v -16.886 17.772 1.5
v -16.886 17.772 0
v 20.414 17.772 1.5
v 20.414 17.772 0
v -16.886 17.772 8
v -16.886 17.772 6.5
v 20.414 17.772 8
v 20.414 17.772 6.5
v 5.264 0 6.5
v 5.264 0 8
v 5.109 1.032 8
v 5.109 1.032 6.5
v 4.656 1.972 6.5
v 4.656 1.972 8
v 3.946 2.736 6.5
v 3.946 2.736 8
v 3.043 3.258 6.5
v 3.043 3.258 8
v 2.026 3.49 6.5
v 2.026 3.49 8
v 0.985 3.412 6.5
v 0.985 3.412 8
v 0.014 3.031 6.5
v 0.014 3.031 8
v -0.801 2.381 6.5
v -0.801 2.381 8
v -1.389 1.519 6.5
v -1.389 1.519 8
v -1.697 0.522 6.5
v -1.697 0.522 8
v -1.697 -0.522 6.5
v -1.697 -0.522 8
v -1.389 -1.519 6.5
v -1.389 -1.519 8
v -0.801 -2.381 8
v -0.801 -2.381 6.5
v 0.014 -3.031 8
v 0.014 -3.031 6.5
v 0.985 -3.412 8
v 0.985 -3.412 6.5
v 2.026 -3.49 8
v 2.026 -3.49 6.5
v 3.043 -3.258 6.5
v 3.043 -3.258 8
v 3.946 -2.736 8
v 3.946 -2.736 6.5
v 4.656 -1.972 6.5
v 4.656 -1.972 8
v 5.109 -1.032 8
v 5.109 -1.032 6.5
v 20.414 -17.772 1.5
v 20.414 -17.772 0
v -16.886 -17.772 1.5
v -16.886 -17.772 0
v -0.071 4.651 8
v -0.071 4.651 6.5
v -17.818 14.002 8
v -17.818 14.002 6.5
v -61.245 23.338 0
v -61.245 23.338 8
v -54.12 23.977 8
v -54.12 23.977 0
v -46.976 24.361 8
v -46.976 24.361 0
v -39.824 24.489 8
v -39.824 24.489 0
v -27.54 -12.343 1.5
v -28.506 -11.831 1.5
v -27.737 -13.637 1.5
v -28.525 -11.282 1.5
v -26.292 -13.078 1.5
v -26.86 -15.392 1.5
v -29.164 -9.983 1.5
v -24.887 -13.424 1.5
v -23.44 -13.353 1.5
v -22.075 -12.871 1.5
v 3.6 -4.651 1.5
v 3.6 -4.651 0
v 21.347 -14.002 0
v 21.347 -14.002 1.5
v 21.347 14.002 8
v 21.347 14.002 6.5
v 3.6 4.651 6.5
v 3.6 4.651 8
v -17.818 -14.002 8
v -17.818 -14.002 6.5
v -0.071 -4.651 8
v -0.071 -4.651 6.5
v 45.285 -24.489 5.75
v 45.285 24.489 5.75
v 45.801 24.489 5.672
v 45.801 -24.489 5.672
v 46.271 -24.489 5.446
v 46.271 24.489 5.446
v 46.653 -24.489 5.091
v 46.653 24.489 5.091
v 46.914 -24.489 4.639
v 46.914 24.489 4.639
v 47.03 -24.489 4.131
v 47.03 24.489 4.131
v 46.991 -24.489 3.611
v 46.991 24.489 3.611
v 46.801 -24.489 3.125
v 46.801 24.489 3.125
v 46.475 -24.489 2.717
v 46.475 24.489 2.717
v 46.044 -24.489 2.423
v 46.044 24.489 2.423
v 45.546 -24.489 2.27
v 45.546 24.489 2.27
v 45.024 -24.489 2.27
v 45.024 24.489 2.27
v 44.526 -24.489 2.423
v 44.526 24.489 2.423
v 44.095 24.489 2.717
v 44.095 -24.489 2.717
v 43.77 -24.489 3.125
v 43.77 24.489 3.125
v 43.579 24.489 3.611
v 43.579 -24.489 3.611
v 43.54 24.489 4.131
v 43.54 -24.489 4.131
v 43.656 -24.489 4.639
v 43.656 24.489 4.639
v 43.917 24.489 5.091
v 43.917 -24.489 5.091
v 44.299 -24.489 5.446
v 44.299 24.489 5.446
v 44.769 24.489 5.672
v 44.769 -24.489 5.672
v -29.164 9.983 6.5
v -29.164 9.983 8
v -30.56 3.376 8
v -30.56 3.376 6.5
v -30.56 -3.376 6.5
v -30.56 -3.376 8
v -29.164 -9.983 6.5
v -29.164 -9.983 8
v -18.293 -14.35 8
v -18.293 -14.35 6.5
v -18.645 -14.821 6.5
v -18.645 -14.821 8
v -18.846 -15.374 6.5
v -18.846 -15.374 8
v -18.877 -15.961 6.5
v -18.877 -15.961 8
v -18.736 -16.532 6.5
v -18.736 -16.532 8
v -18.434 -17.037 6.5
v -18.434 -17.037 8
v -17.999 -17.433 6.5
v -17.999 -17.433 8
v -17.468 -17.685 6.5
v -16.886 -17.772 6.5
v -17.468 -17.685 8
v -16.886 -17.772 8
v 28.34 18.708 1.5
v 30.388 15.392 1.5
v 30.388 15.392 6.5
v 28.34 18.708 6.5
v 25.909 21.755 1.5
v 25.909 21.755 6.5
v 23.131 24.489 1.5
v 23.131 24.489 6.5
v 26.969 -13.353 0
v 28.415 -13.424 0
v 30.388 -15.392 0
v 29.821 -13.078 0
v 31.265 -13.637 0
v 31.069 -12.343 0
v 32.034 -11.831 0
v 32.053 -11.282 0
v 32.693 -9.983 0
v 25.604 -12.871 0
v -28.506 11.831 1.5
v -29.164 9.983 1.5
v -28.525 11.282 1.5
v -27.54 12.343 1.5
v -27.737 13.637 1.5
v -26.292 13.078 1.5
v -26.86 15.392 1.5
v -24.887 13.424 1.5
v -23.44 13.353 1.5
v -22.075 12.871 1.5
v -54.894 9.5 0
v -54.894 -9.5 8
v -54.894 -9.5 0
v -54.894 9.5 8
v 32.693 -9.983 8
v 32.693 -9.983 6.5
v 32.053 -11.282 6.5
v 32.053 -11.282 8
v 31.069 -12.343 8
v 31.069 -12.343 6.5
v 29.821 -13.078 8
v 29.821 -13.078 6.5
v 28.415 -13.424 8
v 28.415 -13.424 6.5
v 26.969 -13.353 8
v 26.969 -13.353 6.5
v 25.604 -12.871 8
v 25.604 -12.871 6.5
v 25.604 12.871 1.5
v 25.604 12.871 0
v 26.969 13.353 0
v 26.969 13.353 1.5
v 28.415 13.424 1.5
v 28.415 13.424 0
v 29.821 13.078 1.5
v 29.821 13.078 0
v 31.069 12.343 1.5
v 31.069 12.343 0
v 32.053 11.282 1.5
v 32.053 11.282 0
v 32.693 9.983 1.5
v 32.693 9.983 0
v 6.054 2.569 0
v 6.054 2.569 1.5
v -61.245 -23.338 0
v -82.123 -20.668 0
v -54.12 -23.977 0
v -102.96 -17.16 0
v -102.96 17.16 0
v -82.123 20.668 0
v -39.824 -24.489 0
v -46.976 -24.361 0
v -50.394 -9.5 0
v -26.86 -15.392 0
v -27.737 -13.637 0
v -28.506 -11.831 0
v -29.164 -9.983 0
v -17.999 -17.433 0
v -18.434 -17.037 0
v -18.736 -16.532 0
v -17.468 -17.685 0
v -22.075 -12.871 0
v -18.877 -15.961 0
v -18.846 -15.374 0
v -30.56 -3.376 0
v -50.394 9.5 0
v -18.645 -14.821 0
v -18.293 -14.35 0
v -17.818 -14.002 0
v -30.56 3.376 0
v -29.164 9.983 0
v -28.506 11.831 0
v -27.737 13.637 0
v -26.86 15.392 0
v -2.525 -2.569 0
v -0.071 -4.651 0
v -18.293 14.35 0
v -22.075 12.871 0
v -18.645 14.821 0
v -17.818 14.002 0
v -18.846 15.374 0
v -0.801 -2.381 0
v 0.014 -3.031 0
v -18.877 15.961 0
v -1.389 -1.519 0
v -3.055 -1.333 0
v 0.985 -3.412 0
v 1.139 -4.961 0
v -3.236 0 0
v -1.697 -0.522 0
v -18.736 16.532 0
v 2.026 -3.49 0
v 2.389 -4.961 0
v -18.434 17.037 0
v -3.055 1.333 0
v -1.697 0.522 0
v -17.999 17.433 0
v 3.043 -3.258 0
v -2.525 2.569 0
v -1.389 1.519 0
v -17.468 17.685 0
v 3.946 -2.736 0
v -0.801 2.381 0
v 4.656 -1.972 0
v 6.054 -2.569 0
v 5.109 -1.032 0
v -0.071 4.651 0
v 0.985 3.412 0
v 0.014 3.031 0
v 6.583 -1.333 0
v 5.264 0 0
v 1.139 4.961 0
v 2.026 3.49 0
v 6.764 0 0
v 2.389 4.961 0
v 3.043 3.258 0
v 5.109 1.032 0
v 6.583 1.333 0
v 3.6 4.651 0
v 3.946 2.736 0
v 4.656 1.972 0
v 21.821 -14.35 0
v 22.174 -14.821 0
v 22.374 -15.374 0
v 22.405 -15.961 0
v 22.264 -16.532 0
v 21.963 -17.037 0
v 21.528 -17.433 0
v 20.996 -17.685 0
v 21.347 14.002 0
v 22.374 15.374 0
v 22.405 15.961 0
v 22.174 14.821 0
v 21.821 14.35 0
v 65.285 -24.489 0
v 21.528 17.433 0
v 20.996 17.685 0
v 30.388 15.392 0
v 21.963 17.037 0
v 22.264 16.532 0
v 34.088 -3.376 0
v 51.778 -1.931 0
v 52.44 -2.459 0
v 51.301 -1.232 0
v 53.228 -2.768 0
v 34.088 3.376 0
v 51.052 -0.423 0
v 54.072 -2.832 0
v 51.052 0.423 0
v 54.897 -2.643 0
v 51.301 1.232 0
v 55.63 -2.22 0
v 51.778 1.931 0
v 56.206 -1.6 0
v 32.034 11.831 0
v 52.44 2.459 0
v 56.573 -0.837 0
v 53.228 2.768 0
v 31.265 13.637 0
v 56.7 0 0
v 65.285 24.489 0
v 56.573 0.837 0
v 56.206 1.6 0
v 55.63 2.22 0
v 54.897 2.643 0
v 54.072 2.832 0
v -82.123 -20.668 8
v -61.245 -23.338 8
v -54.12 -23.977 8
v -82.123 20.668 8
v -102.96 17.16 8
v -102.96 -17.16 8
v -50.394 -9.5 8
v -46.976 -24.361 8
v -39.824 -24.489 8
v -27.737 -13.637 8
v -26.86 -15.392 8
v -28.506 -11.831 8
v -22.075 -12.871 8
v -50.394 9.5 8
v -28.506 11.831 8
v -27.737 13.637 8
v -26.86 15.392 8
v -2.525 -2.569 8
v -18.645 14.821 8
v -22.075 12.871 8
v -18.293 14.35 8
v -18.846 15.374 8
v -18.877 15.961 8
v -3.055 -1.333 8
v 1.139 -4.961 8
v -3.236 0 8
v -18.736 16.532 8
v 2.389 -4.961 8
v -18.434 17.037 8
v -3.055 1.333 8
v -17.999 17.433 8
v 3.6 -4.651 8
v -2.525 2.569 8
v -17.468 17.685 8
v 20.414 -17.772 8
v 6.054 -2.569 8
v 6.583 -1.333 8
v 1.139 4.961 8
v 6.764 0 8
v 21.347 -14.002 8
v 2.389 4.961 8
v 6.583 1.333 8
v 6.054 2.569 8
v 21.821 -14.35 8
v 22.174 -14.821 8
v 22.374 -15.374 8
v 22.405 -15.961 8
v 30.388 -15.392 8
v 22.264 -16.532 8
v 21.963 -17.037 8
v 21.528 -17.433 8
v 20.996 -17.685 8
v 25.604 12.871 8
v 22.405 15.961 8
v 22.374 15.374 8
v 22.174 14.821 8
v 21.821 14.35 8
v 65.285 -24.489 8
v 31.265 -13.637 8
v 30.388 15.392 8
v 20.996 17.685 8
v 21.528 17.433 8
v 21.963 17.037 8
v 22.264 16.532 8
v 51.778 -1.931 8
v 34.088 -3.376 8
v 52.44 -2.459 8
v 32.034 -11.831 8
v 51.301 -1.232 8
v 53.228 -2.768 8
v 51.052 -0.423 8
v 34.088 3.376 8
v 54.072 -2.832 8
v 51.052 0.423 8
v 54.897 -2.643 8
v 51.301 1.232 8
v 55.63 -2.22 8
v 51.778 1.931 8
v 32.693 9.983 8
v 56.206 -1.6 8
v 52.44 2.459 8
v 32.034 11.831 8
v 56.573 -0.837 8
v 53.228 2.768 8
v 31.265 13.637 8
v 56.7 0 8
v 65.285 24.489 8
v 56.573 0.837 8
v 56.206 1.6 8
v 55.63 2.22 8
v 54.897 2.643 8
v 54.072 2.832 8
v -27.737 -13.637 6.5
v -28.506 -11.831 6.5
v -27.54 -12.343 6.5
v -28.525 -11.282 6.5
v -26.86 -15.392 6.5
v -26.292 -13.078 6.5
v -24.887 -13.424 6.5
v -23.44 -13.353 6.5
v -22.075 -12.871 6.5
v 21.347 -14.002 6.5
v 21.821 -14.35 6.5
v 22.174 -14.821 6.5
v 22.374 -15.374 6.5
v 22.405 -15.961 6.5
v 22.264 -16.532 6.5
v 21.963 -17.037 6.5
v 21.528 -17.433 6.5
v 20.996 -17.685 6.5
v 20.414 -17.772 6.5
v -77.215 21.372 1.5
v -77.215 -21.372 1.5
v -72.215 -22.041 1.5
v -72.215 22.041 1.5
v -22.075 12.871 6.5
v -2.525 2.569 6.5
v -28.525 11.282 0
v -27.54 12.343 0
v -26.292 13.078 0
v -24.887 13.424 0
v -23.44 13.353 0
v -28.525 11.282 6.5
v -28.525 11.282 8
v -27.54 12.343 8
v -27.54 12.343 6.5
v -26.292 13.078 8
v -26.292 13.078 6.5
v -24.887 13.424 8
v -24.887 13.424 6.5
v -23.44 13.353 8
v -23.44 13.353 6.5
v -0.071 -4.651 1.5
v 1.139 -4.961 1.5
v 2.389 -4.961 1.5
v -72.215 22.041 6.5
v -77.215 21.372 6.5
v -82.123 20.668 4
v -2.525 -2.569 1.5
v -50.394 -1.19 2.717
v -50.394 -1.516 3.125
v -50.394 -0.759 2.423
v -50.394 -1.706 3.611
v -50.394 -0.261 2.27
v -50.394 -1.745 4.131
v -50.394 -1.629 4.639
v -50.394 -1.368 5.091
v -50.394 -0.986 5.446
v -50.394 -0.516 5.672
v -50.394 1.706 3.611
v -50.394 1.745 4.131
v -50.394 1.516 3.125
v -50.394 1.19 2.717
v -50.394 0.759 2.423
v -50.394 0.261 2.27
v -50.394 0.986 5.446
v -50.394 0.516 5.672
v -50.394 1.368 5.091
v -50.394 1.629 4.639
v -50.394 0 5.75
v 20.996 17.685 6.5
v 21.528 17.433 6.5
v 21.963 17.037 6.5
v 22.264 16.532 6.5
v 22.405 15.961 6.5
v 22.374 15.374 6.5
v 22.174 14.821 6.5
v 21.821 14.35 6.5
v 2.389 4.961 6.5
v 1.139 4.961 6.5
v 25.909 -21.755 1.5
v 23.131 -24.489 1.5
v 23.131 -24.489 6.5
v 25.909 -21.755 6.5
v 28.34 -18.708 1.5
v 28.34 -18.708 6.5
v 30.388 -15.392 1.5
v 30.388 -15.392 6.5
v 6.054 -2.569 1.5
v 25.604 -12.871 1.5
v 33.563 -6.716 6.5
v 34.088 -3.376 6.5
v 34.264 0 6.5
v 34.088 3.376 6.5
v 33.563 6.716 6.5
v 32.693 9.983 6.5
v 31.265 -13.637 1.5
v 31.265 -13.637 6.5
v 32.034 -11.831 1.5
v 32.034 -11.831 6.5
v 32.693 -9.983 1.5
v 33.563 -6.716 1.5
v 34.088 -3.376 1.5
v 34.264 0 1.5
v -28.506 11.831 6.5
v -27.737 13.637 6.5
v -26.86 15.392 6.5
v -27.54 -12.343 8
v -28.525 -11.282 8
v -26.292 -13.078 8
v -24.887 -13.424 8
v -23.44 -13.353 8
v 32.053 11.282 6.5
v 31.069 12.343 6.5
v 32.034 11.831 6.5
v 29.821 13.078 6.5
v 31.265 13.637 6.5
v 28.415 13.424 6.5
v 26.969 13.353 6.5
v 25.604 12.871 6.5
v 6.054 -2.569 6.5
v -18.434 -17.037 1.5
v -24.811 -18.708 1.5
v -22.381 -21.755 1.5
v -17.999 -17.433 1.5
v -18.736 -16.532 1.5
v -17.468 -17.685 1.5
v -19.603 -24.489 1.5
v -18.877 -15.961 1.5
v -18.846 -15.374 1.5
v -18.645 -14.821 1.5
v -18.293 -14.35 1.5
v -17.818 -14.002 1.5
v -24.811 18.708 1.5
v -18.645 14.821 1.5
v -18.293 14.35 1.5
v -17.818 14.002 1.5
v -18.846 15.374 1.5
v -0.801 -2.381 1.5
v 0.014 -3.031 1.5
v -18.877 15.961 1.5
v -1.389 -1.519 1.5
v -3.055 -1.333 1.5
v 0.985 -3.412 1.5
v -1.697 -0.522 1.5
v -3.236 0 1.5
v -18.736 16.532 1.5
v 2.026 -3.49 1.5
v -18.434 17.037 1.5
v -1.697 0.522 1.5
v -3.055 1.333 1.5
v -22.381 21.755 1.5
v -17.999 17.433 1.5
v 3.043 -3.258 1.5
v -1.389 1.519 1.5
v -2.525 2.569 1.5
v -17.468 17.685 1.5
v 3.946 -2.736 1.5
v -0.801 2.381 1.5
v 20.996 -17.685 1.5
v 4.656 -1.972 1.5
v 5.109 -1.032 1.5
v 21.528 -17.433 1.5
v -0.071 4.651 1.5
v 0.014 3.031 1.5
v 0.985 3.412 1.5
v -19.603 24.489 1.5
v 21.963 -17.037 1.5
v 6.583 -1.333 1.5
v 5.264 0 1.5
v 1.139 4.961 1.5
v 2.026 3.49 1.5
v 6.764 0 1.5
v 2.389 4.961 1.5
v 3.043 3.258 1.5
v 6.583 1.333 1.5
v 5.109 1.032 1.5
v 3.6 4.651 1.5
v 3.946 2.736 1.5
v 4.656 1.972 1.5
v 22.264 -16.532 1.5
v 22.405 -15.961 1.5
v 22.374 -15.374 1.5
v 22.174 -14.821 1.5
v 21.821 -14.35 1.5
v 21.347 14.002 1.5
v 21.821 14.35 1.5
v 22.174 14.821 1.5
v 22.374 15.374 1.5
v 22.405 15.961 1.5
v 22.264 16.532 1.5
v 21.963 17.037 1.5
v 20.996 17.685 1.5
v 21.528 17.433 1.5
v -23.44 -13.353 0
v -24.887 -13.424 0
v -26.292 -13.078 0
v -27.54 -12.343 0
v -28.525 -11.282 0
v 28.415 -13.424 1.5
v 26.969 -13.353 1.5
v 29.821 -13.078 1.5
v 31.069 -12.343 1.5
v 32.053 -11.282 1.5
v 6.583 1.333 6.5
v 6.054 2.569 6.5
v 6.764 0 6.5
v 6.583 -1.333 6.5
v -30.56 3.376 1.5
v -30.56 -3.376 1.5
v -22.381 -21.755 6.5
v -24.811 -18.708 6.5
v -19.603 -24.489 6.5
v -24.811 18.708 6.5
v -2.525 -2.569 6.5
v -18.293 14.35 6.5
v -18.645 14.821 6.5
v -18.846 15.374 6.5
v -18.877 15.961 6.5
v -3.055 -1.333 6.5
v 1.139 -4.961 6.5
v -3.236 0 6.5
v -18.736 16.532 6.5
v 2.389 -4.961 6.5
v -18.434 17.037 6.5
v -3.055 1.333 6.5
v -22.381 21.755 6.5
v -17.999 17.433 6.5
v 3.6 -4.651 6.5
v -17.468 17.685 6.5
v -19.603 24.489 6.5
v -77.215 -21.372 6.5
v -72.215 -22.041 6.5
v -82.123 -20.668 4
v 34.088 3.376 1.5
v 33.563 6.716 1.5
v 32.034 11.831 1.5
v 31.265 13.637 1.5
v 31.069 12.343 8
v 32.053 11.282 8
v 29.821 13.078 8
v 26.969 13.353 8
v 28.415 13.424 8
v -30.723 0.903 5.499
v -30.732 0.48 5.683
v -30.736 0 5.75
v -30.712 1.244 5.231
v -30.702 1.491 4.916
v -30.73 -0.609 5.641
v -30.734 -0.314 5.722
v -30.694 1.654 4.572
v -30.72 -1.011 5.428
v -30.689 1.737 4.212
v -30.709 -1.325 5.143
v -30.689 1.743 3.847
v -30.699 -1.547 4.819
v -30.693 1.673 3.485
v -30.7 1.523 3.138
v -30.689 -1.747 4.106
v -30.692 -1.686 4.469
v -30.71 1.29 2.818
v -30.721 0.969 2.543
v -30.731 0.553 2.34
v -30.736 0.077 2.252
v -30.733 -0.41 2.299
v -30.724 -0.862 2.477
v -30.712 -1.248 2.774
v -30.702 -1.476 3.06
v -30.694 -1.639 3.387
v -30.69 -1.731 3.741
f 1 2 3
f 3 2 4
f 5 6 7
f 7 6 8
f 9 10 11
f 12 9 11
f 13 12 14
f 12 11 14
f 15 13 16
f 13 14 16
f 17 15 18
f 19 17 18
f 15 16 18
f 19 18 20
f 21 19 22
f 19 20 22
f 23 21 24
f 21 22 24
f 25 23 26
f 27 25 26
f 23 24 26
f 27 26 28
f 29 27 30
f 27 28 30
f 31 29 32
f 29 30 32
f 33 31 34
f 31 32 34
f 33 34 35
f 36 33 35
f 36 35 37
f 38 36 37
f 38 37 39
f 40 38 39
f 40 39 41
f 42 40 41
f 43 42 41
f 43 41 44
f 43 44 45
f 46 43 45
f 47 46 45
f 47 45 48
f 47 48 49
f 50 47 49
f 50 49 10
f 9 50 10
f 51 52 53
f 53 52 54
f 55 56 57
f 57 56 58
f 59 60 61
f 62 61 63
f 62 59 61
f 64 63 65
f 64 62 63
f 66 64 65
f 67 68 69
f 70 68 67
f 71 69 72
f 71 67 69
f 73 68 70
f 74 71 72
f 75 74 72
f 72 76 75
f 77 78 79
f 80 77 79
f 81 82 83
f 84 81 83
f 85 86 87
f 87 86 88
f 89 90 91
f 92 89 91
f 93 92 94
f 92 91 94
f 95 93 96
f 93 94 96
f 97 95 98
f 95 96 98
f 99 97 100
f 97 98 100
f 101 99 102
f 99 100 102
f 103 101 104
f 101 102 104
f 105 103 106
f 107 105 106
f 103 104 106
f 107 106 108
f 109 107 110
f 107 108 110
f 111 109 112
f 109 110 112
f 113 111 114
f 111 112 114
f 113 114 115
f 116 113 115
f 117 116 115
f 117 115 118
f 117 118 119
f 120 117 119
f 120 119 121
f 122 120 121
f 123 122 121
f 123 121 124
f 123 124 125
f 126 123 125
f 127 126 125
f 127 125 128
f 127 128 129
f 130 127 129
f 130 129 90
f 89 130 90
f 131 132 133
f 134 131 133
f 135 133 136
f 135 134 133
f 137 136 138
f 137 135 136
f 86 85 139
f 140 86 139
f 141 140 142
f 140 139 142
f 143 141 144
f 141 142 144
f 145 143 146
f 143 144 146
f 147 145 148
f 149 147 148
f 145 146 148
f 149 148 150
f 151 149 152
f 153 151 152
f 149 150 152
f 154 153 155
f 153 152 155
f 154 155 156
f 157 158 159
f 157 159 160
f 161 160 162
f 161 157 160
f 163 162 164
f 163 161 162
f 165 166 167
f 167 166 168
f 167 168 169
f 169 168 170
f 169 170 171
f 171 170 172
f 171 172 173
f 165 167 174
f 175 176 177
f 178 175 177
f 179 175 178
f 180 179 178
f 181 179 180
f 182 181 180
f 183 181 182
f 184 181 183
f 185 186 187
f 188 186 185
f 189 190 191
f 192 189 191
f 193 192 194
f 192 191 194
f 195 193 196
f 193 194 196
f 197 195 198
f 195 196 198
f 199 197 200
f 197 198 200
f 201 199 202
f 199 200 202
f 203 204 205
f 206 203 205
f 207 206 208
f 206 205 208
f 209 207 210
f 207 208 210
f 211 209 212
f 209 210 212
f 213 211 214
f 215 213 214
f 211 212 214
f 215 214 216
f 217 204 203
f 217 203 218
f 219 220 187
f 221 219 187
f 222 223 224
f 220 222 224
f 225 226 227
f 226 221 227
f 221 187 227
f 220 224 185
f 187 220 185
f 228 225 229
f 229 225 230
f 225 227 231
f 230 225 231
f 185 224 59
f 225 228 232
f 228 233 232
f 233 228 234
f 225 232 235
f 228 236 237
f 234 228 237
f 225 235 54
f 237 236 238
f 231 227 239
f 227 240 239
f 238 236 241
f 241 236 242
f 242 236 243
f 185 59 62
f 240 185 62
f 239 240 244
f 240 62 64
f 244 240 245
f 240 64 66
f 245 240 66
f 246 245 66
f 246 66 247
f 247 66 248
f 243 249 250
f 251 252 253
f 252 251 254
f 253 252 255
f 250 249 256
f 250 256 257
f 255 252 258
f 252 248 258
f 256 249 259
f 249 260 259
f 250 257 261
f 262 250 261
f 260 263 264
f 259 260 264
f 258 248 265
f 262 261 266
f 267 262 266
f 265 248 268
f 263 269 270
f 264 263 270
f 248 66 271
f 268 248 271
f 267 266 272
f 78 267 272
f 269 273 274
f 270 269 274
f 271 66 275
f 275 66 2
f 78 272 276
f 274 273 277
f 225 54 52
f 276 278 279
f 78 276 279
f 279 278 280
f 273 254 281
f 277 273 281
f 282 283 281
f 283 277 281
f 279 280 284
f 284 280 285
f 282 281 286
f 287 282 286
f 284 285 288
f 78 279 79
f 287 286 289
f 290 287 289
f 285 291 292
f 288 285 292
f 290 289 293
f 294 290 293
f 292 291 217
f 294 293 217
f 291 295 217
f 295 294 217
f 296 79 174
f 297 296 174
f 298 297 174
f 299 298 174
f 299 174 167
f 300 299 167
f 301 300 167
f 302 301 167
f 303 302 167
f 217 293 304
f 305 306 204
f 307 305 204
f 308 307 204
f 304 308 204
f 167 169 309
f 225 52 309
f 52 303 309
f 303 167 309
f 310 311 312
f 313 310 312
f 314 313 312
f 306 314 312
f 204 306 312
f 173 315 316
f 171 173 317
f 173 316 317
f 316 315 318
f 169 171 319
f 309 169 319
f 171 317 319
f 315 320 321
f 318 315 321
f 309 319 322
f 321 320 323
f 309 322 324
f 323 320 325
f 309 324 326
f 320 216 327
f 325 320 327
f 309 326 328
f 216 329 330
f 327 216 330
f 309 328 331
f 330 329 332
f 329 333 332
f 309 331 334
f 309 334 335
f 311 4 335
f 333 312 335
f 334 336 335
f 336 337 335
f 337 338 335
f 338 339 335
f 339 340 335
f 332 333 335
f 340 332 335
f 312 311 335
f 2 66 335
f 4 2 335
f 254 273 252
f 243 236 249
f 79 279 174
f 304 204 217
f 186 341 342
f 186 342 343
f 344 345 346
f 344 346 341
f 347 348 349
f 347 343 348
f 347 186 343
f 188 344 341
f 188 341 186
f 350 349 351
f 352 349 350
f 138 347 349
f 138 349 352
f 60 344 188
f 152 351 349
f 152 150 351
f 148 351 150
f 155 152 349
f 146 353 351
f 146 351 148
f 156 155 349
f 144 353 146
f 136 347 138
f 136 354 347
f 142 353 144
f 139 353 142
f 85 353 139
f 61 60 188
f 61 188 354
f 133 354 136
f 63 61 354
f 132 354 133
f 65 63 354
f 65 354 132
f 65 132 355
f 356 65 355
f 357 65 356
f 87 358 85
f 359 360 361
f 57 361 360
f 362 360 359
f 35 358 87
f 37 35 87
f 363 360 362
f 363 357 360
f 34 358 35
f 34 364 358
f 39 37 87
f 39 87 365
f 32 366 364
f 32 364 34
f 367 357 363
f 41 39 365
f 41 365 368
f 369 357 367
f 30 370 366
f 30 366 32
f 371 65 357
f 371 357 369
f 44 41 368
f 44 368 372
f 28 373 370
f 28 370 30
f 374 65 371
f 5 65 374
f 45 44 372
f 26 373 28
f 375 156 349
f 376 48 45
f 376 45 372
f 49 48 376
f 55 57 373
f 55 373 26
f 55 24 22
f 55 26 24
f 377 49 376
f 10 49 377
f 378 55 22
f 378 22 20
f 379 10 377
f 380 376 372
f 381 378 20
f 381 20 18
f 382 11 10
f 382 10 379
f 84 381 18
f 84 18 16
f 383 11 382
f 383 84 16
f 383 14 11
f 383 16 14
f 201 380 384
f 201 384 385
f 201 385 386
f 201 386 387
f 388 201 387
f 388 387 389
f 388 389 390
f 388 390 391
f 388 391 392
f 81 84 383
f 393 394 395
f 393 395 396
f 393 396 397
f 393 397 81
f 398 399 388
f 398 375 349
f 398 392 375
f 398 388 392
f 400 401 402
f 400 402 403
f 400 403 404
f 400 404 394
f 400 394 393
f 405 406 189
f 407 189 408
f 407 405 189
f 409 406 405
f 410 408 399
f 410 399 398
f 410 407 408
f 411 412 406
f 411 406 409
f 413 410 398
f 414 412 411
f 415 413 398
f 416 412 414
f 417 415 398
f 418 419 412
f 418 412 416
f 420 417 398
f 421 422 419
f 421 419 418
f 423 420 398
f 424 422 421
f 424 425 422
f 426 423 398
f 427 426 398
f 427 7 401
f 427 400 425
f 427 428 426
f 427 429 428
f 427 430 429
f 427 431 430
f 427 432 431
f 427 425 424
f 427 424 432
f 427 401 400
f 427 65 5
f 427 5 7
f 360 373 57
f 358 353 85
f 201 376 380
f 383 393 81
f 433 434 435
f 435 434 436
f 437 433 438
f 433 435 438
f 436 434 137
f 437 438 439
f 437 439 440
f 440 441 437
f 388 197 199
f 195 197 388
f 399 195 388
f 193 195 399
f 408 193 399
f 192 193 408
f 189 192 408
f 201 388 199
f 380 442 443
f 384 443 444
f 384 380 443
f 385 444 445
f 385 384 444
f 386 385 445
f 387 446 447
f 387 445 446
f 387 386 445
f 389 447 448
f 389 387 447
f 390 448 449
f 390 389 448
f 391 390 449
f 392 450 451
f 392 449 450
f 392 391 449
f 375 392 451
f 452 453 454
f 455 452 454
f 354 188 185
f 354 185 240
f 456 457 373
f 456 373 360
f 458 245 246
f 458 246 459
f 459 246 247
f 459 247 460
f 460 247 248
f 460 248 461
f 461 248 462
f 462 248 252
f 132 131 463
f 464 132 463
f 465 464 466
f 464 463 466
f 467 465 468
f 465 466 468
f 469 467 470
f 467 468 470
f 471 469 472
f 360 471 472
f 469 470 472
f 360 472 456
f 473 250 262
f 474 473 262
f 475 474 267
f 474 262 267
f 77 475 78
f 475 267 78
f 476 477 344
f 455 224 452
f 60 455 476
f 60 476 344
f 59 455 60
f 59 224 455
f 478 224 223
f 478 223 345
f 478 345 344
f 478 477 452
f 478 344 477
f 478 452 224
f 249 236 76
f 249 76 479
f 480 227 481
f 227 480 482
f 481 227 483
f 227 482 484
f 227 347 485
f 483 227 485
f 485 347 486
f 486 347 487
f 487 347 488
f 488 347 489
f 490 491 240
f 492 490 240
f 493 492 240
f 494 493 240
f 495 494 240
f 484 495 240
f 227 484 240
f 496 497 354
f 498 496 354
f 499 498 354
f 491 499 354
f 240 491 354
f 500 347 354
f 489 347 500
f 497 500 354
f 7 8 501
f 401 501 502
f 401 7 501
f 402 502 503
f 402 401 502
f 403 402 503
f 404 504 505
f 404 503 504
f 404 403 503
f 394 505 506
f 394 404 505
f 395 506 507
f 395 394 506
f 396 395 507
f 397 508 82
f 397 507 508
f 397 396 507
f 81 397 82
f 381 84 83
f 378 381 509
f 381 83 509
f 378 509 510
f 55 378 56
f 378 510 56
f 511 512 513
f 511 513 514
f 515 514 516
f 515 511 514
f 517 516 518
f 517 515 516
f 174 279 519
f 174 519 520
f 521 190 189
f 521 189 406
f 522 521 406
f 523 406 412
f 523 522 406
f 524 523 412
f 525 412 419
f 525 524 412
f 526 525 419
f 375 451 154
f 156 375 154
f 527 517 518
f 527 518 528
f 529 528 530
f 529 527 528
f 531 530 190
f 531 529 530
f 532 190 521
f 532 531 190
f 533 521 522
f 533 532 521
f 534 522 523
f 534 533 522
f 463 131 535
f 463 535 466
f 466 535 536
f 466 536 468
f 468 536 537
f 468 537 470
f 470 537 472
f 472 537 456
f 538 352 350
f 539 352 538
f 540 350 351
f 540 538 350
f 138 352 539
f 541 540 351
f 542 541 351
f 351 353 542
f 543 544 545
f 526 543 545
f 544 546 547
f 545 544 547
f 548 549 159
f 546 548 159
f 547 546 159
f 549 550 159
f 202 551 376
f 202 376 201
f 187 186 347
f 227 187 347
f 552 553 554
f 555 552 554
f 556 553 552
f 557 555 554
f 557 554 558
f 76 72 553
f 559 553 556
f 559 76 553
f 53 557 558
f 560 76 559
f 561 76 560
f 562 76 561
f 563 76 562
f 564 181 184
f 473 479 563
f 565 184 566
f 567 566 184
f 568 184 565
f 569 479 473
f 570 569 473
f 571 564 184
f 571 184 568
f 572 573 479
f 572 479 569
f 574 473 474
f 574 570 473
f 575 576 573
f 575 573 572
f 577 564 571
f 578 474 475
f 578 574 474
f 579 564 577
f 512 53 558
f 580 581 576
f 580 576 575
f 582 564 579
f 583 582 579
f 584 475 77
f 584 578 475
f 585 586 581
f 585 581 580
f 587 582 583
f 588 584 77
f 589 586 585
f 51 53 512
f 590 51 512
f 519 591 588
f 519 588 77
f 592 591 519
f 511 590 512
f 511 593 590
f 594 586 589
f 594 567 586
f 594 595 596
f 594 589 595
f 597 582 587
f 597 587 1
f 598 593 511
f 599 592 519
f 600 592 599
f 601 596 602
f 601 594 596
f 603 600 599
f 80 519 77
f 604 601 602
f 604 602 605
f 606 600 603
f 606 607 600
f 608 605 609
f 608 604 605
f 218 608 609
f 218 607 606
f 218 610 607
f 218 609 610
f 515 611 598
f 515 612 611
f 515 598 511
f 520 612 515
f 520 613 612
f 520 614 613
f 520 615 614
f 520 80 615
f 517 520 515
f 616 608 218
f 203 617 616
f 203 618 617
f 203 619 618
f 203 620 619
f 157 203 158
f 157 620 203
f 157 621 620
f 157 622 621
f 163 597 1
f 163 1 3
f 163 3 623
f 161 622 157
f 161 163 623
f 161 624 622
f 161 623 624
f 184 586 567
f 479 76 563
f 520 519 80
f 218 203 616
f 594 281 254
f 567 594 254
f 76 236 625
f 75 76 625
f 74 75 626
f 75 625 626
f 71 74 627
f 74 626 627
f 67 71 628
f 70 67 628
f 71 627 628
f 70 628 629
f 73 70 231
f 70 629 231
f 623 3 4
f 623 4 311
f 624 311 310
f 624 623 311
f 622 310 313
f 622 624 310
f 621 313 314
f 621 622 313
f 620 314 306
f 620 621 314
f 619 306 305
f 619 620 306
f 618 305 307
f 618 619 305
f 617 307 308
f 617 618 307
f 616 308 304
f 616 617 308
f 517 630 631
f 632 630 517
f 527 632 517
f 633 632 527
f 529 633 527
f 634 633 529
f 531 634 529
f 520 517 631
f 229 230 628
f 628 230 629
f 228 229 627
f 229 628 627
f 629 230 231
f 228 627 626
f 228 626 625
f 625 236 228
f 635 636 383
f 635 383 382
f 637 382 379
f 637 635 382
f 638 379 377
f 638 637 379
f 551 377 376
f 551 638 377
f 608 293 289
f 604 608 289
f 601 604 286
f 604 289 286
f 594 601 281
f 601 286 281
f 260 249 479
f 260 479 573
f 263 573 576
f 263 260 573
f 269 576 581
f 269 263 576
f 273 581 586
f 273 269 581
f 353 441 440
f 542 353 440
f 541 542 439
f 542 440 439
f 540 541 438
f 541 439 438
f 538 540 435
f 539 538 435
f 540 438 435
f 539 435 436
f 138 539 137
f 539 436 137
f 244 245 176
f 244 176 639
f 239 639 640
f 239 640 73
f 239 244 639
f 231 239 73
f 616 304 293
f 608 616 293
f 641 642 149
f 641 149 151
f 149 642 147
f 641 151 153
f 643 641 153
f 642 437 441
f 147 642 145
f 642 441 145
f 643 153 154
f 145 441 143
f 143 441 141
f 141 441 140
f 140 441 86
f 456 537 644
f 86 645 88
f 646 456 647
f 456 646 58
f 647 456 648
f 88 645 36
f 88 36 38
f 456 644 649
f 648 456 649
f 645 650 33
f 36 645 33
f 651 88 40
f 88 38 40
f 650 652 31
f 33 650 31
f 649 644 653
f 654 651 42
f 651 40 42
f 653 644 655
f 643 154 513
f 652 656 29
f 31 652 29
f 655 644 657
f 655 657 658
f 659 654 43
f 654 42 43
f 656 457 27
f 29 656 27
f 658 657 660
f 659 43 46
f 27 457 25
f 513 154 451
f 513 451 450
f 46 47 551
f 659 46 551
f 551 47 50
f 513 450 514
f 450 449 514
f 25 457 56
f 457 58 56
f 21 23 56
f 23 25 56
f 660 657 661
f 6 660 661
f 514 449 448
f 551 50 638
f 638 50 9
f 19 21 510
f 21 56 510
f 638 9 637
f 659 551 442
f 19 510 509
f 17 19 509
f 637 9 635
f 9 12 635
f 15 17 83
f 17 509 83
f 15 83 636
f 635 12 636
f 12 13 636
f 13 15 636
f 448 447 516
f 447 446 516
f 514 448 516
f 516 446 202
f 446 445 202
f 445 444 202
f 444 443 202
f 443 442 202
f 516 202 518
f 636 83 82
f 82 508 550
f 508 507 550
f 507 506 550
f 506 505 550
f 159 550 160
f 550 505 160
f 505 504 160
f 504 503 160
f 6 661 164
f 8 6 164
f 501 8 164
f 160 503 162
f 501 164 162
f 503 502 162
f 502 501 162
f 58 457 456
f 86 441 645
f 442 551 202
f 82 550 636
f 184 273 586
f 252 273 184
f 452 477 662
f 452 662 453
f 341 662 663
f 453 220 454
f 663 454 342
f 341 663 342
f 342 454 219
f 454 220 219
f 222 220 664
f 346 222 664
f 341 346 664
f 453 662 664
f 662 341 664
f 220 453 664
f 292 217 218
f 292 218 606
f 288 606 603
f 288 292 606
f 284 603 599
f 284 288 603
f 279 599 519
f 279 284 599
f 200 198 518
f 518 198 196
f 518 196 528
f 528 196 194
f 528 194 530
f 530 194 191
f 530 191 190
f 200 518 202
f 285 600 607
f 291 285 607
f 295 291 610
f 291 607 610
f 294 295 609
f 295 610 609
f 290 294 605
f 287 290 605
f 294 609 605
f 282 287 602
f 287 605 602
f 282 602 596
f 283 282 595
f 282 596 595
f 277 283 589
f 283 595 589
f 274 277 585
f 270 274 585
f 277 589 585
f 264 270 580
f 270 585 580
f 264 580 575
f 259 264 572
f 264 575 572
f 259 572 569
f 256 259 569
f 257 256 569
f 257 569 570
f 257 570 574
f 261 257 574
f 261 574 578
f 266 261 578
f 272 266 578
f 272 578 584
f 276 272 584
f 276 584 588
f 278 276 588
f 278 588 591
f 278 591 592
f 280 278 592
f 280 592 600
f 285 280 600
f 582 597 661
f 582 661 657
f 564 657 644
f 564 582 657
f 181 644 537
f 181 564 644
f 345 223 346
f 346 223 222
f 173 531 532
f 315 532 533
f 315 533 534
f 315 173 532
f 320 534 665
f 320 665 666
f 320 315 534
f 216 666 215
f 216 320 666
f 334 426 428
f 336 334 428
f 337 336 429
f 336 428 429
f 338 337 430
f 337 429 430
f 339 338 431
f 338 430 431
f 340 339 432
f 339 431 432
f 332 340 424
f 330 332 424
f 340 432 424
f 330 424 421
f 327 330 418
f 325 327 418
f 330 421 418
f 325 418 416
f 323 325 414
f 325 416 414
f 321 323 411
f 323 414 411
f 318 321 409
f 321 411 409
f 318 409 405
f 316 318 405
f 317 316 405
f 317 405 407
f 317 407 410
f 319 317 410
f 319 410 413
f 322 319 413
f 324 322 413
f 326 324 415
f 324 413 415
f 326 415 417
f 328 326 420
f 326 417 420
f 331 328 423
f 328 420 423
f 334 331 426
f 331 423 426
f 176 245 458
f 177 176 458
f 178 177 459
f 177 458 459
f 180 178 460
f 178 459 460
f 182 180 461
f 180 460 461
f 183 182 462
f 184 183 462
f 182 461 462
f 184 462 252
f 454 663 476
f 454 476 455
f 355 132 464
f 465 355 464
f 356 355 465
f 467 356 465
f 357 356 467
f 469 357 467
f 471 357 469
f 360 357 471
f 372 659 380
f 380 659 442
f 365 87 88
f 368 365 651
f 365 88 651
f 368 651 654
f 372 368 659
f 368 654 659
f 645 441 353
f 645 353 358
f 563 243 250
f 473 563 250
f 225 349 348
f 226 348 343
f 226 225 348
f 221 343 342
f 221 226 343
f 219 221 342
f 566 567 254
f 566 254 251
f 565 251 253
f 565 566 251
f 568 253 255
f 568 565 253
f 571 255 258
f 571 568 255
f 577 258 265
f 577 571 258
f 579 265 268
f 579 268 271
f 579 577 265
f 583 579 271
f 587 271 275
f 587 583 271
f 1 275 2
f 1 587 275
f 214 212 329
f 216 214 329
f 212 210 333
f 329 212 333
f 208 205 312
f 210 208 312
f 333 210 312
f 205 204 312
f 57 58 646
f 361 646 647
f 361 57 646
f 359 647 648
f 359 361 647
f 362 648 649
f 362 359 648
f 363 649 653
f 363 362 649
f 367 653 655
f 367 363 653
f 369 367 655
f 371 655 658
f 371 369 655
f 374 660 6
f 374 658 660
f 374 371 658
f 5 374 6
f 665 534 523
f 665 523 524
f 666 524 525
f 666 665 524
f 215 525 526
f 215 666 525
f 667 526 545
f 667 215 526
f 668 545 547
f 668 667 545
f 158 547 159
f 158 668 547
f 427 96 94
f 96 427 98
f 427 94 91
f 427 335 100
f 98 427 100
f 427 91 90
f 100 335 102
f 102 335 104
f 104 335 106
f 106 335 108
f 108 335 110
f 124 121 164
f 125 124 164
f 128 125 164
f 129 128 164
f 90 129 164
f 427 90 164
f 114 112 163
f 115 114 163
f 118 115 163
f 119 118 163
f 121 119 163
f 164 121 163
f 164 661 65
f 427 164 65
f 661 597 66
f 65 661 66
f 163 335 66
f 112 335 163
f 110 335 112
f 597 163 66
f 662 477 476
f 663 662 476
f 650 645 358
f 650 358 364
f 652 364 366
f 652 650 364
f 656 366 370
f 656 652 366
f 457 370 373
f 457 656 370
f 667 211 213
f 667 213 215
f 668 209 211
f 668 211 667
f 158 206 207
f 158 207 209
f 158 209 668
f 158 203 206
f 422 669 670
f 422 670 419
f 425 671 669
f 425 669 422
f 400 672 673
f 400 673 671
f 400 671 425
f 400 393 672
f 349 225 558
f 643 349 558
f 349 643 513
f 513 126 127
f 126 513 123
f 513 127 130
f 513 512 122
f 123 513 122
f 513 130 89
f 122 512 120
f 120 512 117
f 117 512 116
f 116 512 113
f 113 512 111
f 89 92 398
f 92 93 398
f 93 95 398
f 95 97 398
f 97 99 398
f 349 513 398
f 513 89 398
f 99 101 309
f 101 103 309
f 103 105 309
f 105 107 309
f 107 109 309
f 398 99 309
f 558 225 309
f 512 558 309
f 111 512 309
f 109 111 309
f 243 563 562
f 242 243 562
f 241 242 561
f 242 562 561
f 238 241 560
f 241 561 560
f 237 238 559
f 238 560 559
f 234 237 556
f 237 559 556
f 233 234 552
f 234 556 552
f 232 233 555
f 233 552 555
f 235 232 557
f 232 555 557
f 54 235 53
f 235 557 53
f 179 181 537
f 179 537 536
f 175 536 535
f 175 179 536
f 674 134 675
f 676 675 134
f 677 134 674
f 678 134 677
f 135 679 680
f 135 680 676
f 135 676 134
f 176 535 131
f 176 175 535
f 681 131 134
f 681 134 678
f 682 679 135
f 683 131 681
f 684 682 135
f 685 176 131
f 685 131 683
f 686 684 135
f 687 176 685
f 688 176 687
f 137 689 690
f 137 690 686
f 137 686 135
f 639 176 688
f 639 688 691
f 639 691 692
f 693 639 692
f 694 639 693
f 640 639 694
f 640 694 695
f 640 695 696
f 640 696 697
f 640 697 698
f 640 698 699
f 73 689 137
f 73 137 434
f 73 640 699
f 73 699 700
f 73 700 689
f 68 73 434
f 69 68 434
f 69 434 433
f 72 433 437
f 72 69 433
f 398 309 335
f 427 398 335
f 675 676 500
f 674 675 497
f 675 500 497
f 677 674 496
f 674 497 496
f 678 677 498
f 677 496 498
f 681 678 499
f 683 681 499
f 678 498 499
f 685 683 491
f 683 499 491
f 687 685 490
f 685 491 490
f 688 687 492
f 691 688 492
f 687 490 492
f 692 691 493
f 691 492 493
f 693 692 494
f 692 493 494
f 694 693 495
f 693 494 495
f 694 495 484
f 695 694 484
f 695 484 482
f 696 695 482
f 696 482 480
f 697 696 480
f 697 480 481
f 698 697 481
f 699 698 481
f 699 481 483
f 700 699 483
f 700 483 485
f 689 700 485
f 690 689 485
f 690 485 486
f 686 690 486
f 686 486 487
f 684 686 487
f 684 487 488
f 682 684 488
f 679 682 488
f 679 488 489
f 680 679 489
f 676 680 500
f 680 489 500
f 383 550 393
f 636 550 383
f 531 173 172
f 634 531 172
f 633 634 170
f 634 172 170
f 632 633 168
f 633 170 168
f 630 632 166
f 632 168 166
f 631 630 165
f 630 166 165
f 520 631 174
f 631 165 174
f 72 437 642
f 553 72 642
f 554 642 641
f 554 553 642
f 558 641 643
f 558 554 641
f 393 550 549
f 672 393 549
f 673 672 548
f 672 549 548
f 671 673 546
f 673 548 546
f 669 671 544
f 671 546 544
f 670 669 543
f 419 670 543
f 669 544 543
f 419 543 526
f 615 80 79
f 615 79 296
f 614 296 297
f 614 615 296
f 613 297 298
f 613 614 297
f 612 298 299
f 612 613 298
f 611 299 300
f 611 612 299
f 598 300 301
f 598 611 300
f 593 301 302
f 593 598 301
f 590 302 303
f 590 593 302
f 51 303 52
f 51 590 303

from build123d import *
from build123d.topology import SkipClean

# Parameters (mm, degrees)
BOSS_EXTRUDE1_DEPTH     = 8
FILLET2_R               = 2
SKETCH3_R               = 2.839661977
CUT_EXTRUDE1_DEPTH      = 8
SKETCH4_R               = 3.5
CUT_EXTRUDE2_DEPTH      = 8
CUT_EXTRUDE3_DEPTH      = 2.5
CUT_EXTRUDE3_DEPTH_BACK = 2.5
SKETCH5_R               = 32.5
SKETCH6_W               = 4.5
SKETCH6_H               = 19
CUT_EXTRUDE4_DEPTH      = 10
SKETCH7_R               = 1.75
CUT_EXTRUDE5_DEPTH      = 51
FILLET3_START           = -1
FILLET3_DEPTH           = 10
FILLET4_START           = -1
FILLET4_DEPTH           = 10
SKETCH9_W               = 5
SKETCH9_H               = 5
CUT_EXTRUDE6_DEPTH      = 51
SKETCH10_R              = 1.75
CUT_EXTRUDE7_DEPTH      = 24
FILLET5_DEPTH           = 1.5
FILLET5_START           = 6.5
FILLET5_2_DEPTH         = 1.5


with BuildPart() as part:
    # Sketch2 → Boss-Extrude1 (new body)
    with BuildSketch(Plane.XY):
        with BuildLine():
            Line((-102.95960155, 17.159933592), (-102.95960155, -17.159933592))
            add(Edge.make_bspline(
                [(-102.95960155, -17.159933592), (-76.189992309, -22.210205625), (-49.286425804, -24.488951052)],
                knots=[0, 0, 0, 0.320704871, 0.320704871, 0.320704871], degree=2))
            Line((-49.286425804, -24.488951052), (65.285160882, -24.488951052))
            Line((65.285160882, -24.488951052), (65.285160882, 24.488951052))
            Line((65.285160882, 24.488951052), (-49.286425804, 24.488951052))
            add(Edge.make_bspline(
                [(-102.95960155, 17.159933592), (-76.189992309, 22.210205625), (-49.286425804, 24.488951052)],
                knots=[0, 0, 0, 0.320704871, 0.320704871, 0.320704871], degree=2))
        make_face()
        with BuildLine():
            Line((-24.971677166, 17.771677006), (28.500163837, 17.771677006))
            Line((28.500163837, 17.771677006), (3.599814154, 4.650879462))
            ThreePointArc((3.599814154, 4.650879462), (1.764243335, 5), (-0.071327484, 4.650879462))
            Line((-0.071327484, 4.650879462), (-24.971677166, 17.771677006))
        make_face(mode=Mode.SUBTRACT)
        with BuildLine():
            Line((3.599814154, -4.650879462), (28.500163837, -17.771677006))
            Line((28.500163837, -17.771677006), (-24.971677166, -17.771677006))
            Line((-24.971677166, -17.771677006), (-0.071327484, -4.650879462))
            ThreePointArc((-0.071327484, -4.650879462), (1.764243335, -5), (3.599814154, -4.650879462))
        make_face(mode=Mode.SUBTRACT)
        with BuildLine():
            Line((-2.525196045, 2.569184657), (-26.859859934, 15.391904107))
            ThreePointArc((-26.859859934, 15.391904107), (-30.735756665, 0), (-26.859859934, -15.391904107))
            Line((-26.859859934, -15.391904107), (-2.525196045, -2.569184657))
            ThreePointArc((-2.525196045, -2.569184657), (-3.235756665, 0), (-2.525196045, 2.569184657))
        make_face(mode=Mode.SUBTRACT)
        with BuildLine():
            Line((6.053682716, -2.569184657), (30.388346604, -15.391904107))
            ThreePointArc((30.388346604, -15.391904107), (34.264243335, 0), (30.388346604, 15.391904107))
            Line((30.388346604, 15.391904107), (6.053682716, 2.569184657))
            ThreePointArc((6.053682716, 2.569184657), (6.764243335, 0), (6.053682716, -2.569184657))
        make_face(mode=Mode.SUBTRACT)
    extrude(amount=BOSS_EXTRUDE1_DEPTH)

    # Fillet2
    fillet2_edges = [part.edges().sort_by_distance(p)[0] for p in [
        (-24.971677166, 17.771677006, 4),
        (28.500163837, 17.771677006, 4),
        (-24.971677166, -17.771677006, 4),
        (28.500163837, -17.771677006, 4),
    ]]
    fillet(fillet2_edges, radius=FILLET2_R)

    # Sketch3 → Cut-Extrude1 (cut)
    with BuildSketch(Plane.XY.offset(8)):
        with Locations((53.859940094, 0)):
            Circle(SKETCH3_R)
    extrude(amount=-CUT_EXTRUDE1_DEPTH, mode=Mode.SUBTRACT)

    # Sketch4 → Cut-Extrude2 (cut)
    with BuildSketch(Plane.XY.offset(8)):
        with Locations((1.764243335, 0)):
            Circle(SKETCH4_R)
    extrude(amount=-CUT_EXTRUDE2_DEPTH, mode=Mode.SUBTRACT)

    # Sketch5 → Cut-Extrude3 (cut, two sides: drawn at the far end of the back side and taken through both)
    with SkipClean():  # the faces are left unmerged after this step: merging them gives an invalid solid
        with BuildSketch(Plane.XY.offset(4).offset(-CUT_EXTRUDE3_DEPTH_BACK)):
            with Locations((1.764243335, 0)):
                Circle(SKETCH5_R)
        extrude(amount=CUT_EXTRUDE3_DEPTH + CUT_EXTRUDE3_DEPTH_BACK, mode=Mode.SUBTRACT)

    # Sketch6 → Cut-Extrude4 (cut)
    with SkipClean():  # the faces are left unmerged after this step: merging them gives an invalid solid
        with BuildSketch(Plane.XY.offset(8)):
            with Locations((-52.644112073, 0)):
                Rectangle(SKETCH6_W, SKETCH6_H)
        extrude(amount=-CUT_EXTRUDE4_DEPTH, mode=Mode.SUBTRACT)

    # Sketch7 → Cut-Extrude5 (cut)
    with SkipClean():  # the faces are left unmerged after this step: merging them gives an invalid solid
        with BuildSketch(Plane(origin=(0, 24.488951052, 0), x_dir=(1, 0, 0), z_dir=(0, 1, 0))):
            with Locations(Location((45.285160882, -4, 0), (0, 0, 270))):
                Circle(SKETCH7_R)
        extrude(amount=-CUT_EXTRUDE5_DEPTH, mode=Mode.SUBTRACT)

    # Fillet3: read off the stored shape, not the designer's step
    # Fillet3 outline → Fillet3 (cut)
    with SkipClean():  # the faces are left unmerged after this step: merging them gives an invalid solid
        with BuildSketch(Plane.XY.offset(FILLET3_START)):
            with BuildLine():
                add(Edge.make_bspline(
                    [(-49.286425804, 24.488951052), (-55.269151656, 23.982211205), (-61.245253134, 23.338415518)],
                    knots=[0, 0, 0, 0.071317285, 0.071317285, 0.071317285], degree=2))
                ThreePointArc((-61.245253134, 23.338415518), (-50.549825889, 24.201110037), (-39.823523948, 24.488951052))
                Line((-39.823523948, 24.488951052), (-49.286425804, 24.488951052))
            make_face()
        extrude(amount=FILLET3_DEPTH, mode=Mode.SUBTRACT)

    # Fillet4: read off the stored shape, not the designer's step
    # Fillet4 outline → Fillet4 (cut)
    with SkipClean():  # the faces are left unmerged after this step: merging them gives an invalid solid
        with BuildSketch(Plane.XY.offset(FILLET4_START)):
            with BuildLine():
                Line((-49.286425804, -24.488951052), (-39.823523948, -24.488951052))
                ThreePointArc((-39.823523948, -24.488951052), (-50.549825889, -24.201110037), (-61.245253134, -23.338415518))
                add(Edge.make_bspline(
                    [(-61.245253134, -23.338415518), (-55.269151656, -23.982211205), (-49.286425804, -24.488951052)],
                    knots=[0.249387586, 0.249387586, 0.249387586, 0.320704871, 0.320704871, 0.320704871], degree=2))
            make_face()
        extrude(amount=FILLET4_DEPTH, mode=Mode.SUBTRACT)

    # Sketch9 → Cut-Extrude6 (cut)
    with SkipClean():  # the faces are left unmerged after this step: merging them gives an invalid solid
        with BuildSketch(Plane(origin=(0, 24.488951052, 0), x_dir=(1, 0, 0), z_dir=(0, 1, 0))):
            with Locations((-74.714839118, -4)):
                Rectangle(SKETCH9_W, SKETCH9_H)
        extrude(amount=-CUT_EXTRUDE6_DEPTH, mode=Mode.SUBTRACT)

    # Sketch10 → Cut-Extrude7 (cut)
    with SkipClean():  # the faces are left unmerged after this step: merging them gives an invalid solid
        with BuildSketch(Plane.ZY.offset(50.394112073)):
            with Locations((4, 0)):
                Circle(SKETCH10_R)
        extrude(amount=-CUT_EXTRUDE7_DEPTH, mode=Mode.SUBTRACT)

    # Fillet5: read off the stored shape, not the designer's step
    # Fillet5 outline → Fillet5 (add)
    with SkipClean():  # the faces are left unmerged after this step: merging them gives an invalid solid
        with BuildSketch(Plane.XY):
            with BuildLine():
                Line((30.388346604, 15.391904107), (25.603831674, 12.87078884))
                ThreePointArc((25.603831674, 12.87078884), (29.820861326, 13.077915151), (32.692963641, 9.983198898))
                ThreePointArc((32.692963641, 9.983198898), (31.663210239, 12.739771507), (30.388346604, 15.391904107))
            make_face()
            with BuildLine():
                ThreePointArc((30.388346604, -15.391904107), (31.663210239, -12.739771507), (32.692963641, -9.983198898))
                ThreePointArc((32.692963641, -9.983198898), (29.820861326, -13.077915151), (25.603831674, -12.87078884))
                Line((25.603831674, -12.87078884), (30.388346604, -15.391904107))
            make_face()
            with BuildLine():
                Line((-26.859859934, -15.391904107), (-22.075345003, -12.87078884))
                ThreePointArc((-22.075345003, -12.87078884), (-26.292374655, -13.077915151), (-29.164476971, -9.983198898))
                ThreePointArc((-29.164476971, -9.983198898), (-28.134723569, -12.739771507), (-26.859859934, -15.391904107))
            make_face()
            with BuildLine():
                ThreePointArc((-26.859859934, 15.391904107), (-28.134723569, 12.739771507), (-29.164476971, 9.983198898))
                ThreePointArc((-29.164476971, 9.983198898), (-26.292374655, 13.077915151), (-22.075345003, 12.87078884))
                Line((-22.075345003, 12.87078884), (-26.859859934, 15.391904107))
            make_face()
        extrude(amount=FILLET5_DEPTH)

    # Fillet5 2 outline → Fillet5 2 (add)
    with SkipClean():  # the faces are left unmerged after this step: merging them gives an invalid solid
        with BuildSketch(Plane.XY.offset(FILLET5_START)):
            with BuildLine():
                Line((30.388346604, 15.391904107), (25.603831674, 12.87078884))
                ThreePointArc((25.603831674, 12.87078884), (29.820861326, 13.077915151), (32.692963641, 9.983198898))
                ThreePointArc((32.692963641, 9.983198898), (31.663210239, 12.739771507), (30.388346604, 15.391904107))
            make_face()
            with BuildLine():
                ThreePointArc((30.388346604, -15.391904107), (31.663210239, -12.739771507), (32.692963641, -9.983198898))
                ThreePointArc((32.692963641, -9.983198898), (29.820861326, -13.077915151), (25.603831674, -12.87078884))
                Line((25.603831674, -12.87078884), (30.388346604, -15.391904107))
            make_face()
            with BuildLine():
                Line((-26.859859934, -15.391904107), (-22.075345003, -12.87078884))
                ThreePointArc((-22.075345003, -12.87078884), (-26.292374655, -13.077915151), (-29.164476971, -9.983198898))
                ThreePointArc((-29.164476971, -9.983198898), (-28.134723569, -12.739771507), (-26.859859934, -15.391904107))
            make_face()
            with BuildLine():
                ThreePointArc((-26.859859934, 15.391904107), (-28.134723569, 12.739771507), (-29.164476971, 9.983198898))
                ThreePointArc((-29.164476971, 9.983198898), (-26.292374655, 13.077915151), (-22.075345003, 12.87078884))
                Line((-22.075345003, 12.87078884), (-26.859859934, 15.391904107))
            make_face()
        extrude(amount=FILLET5_2_DEPTH)


solid = part.part
